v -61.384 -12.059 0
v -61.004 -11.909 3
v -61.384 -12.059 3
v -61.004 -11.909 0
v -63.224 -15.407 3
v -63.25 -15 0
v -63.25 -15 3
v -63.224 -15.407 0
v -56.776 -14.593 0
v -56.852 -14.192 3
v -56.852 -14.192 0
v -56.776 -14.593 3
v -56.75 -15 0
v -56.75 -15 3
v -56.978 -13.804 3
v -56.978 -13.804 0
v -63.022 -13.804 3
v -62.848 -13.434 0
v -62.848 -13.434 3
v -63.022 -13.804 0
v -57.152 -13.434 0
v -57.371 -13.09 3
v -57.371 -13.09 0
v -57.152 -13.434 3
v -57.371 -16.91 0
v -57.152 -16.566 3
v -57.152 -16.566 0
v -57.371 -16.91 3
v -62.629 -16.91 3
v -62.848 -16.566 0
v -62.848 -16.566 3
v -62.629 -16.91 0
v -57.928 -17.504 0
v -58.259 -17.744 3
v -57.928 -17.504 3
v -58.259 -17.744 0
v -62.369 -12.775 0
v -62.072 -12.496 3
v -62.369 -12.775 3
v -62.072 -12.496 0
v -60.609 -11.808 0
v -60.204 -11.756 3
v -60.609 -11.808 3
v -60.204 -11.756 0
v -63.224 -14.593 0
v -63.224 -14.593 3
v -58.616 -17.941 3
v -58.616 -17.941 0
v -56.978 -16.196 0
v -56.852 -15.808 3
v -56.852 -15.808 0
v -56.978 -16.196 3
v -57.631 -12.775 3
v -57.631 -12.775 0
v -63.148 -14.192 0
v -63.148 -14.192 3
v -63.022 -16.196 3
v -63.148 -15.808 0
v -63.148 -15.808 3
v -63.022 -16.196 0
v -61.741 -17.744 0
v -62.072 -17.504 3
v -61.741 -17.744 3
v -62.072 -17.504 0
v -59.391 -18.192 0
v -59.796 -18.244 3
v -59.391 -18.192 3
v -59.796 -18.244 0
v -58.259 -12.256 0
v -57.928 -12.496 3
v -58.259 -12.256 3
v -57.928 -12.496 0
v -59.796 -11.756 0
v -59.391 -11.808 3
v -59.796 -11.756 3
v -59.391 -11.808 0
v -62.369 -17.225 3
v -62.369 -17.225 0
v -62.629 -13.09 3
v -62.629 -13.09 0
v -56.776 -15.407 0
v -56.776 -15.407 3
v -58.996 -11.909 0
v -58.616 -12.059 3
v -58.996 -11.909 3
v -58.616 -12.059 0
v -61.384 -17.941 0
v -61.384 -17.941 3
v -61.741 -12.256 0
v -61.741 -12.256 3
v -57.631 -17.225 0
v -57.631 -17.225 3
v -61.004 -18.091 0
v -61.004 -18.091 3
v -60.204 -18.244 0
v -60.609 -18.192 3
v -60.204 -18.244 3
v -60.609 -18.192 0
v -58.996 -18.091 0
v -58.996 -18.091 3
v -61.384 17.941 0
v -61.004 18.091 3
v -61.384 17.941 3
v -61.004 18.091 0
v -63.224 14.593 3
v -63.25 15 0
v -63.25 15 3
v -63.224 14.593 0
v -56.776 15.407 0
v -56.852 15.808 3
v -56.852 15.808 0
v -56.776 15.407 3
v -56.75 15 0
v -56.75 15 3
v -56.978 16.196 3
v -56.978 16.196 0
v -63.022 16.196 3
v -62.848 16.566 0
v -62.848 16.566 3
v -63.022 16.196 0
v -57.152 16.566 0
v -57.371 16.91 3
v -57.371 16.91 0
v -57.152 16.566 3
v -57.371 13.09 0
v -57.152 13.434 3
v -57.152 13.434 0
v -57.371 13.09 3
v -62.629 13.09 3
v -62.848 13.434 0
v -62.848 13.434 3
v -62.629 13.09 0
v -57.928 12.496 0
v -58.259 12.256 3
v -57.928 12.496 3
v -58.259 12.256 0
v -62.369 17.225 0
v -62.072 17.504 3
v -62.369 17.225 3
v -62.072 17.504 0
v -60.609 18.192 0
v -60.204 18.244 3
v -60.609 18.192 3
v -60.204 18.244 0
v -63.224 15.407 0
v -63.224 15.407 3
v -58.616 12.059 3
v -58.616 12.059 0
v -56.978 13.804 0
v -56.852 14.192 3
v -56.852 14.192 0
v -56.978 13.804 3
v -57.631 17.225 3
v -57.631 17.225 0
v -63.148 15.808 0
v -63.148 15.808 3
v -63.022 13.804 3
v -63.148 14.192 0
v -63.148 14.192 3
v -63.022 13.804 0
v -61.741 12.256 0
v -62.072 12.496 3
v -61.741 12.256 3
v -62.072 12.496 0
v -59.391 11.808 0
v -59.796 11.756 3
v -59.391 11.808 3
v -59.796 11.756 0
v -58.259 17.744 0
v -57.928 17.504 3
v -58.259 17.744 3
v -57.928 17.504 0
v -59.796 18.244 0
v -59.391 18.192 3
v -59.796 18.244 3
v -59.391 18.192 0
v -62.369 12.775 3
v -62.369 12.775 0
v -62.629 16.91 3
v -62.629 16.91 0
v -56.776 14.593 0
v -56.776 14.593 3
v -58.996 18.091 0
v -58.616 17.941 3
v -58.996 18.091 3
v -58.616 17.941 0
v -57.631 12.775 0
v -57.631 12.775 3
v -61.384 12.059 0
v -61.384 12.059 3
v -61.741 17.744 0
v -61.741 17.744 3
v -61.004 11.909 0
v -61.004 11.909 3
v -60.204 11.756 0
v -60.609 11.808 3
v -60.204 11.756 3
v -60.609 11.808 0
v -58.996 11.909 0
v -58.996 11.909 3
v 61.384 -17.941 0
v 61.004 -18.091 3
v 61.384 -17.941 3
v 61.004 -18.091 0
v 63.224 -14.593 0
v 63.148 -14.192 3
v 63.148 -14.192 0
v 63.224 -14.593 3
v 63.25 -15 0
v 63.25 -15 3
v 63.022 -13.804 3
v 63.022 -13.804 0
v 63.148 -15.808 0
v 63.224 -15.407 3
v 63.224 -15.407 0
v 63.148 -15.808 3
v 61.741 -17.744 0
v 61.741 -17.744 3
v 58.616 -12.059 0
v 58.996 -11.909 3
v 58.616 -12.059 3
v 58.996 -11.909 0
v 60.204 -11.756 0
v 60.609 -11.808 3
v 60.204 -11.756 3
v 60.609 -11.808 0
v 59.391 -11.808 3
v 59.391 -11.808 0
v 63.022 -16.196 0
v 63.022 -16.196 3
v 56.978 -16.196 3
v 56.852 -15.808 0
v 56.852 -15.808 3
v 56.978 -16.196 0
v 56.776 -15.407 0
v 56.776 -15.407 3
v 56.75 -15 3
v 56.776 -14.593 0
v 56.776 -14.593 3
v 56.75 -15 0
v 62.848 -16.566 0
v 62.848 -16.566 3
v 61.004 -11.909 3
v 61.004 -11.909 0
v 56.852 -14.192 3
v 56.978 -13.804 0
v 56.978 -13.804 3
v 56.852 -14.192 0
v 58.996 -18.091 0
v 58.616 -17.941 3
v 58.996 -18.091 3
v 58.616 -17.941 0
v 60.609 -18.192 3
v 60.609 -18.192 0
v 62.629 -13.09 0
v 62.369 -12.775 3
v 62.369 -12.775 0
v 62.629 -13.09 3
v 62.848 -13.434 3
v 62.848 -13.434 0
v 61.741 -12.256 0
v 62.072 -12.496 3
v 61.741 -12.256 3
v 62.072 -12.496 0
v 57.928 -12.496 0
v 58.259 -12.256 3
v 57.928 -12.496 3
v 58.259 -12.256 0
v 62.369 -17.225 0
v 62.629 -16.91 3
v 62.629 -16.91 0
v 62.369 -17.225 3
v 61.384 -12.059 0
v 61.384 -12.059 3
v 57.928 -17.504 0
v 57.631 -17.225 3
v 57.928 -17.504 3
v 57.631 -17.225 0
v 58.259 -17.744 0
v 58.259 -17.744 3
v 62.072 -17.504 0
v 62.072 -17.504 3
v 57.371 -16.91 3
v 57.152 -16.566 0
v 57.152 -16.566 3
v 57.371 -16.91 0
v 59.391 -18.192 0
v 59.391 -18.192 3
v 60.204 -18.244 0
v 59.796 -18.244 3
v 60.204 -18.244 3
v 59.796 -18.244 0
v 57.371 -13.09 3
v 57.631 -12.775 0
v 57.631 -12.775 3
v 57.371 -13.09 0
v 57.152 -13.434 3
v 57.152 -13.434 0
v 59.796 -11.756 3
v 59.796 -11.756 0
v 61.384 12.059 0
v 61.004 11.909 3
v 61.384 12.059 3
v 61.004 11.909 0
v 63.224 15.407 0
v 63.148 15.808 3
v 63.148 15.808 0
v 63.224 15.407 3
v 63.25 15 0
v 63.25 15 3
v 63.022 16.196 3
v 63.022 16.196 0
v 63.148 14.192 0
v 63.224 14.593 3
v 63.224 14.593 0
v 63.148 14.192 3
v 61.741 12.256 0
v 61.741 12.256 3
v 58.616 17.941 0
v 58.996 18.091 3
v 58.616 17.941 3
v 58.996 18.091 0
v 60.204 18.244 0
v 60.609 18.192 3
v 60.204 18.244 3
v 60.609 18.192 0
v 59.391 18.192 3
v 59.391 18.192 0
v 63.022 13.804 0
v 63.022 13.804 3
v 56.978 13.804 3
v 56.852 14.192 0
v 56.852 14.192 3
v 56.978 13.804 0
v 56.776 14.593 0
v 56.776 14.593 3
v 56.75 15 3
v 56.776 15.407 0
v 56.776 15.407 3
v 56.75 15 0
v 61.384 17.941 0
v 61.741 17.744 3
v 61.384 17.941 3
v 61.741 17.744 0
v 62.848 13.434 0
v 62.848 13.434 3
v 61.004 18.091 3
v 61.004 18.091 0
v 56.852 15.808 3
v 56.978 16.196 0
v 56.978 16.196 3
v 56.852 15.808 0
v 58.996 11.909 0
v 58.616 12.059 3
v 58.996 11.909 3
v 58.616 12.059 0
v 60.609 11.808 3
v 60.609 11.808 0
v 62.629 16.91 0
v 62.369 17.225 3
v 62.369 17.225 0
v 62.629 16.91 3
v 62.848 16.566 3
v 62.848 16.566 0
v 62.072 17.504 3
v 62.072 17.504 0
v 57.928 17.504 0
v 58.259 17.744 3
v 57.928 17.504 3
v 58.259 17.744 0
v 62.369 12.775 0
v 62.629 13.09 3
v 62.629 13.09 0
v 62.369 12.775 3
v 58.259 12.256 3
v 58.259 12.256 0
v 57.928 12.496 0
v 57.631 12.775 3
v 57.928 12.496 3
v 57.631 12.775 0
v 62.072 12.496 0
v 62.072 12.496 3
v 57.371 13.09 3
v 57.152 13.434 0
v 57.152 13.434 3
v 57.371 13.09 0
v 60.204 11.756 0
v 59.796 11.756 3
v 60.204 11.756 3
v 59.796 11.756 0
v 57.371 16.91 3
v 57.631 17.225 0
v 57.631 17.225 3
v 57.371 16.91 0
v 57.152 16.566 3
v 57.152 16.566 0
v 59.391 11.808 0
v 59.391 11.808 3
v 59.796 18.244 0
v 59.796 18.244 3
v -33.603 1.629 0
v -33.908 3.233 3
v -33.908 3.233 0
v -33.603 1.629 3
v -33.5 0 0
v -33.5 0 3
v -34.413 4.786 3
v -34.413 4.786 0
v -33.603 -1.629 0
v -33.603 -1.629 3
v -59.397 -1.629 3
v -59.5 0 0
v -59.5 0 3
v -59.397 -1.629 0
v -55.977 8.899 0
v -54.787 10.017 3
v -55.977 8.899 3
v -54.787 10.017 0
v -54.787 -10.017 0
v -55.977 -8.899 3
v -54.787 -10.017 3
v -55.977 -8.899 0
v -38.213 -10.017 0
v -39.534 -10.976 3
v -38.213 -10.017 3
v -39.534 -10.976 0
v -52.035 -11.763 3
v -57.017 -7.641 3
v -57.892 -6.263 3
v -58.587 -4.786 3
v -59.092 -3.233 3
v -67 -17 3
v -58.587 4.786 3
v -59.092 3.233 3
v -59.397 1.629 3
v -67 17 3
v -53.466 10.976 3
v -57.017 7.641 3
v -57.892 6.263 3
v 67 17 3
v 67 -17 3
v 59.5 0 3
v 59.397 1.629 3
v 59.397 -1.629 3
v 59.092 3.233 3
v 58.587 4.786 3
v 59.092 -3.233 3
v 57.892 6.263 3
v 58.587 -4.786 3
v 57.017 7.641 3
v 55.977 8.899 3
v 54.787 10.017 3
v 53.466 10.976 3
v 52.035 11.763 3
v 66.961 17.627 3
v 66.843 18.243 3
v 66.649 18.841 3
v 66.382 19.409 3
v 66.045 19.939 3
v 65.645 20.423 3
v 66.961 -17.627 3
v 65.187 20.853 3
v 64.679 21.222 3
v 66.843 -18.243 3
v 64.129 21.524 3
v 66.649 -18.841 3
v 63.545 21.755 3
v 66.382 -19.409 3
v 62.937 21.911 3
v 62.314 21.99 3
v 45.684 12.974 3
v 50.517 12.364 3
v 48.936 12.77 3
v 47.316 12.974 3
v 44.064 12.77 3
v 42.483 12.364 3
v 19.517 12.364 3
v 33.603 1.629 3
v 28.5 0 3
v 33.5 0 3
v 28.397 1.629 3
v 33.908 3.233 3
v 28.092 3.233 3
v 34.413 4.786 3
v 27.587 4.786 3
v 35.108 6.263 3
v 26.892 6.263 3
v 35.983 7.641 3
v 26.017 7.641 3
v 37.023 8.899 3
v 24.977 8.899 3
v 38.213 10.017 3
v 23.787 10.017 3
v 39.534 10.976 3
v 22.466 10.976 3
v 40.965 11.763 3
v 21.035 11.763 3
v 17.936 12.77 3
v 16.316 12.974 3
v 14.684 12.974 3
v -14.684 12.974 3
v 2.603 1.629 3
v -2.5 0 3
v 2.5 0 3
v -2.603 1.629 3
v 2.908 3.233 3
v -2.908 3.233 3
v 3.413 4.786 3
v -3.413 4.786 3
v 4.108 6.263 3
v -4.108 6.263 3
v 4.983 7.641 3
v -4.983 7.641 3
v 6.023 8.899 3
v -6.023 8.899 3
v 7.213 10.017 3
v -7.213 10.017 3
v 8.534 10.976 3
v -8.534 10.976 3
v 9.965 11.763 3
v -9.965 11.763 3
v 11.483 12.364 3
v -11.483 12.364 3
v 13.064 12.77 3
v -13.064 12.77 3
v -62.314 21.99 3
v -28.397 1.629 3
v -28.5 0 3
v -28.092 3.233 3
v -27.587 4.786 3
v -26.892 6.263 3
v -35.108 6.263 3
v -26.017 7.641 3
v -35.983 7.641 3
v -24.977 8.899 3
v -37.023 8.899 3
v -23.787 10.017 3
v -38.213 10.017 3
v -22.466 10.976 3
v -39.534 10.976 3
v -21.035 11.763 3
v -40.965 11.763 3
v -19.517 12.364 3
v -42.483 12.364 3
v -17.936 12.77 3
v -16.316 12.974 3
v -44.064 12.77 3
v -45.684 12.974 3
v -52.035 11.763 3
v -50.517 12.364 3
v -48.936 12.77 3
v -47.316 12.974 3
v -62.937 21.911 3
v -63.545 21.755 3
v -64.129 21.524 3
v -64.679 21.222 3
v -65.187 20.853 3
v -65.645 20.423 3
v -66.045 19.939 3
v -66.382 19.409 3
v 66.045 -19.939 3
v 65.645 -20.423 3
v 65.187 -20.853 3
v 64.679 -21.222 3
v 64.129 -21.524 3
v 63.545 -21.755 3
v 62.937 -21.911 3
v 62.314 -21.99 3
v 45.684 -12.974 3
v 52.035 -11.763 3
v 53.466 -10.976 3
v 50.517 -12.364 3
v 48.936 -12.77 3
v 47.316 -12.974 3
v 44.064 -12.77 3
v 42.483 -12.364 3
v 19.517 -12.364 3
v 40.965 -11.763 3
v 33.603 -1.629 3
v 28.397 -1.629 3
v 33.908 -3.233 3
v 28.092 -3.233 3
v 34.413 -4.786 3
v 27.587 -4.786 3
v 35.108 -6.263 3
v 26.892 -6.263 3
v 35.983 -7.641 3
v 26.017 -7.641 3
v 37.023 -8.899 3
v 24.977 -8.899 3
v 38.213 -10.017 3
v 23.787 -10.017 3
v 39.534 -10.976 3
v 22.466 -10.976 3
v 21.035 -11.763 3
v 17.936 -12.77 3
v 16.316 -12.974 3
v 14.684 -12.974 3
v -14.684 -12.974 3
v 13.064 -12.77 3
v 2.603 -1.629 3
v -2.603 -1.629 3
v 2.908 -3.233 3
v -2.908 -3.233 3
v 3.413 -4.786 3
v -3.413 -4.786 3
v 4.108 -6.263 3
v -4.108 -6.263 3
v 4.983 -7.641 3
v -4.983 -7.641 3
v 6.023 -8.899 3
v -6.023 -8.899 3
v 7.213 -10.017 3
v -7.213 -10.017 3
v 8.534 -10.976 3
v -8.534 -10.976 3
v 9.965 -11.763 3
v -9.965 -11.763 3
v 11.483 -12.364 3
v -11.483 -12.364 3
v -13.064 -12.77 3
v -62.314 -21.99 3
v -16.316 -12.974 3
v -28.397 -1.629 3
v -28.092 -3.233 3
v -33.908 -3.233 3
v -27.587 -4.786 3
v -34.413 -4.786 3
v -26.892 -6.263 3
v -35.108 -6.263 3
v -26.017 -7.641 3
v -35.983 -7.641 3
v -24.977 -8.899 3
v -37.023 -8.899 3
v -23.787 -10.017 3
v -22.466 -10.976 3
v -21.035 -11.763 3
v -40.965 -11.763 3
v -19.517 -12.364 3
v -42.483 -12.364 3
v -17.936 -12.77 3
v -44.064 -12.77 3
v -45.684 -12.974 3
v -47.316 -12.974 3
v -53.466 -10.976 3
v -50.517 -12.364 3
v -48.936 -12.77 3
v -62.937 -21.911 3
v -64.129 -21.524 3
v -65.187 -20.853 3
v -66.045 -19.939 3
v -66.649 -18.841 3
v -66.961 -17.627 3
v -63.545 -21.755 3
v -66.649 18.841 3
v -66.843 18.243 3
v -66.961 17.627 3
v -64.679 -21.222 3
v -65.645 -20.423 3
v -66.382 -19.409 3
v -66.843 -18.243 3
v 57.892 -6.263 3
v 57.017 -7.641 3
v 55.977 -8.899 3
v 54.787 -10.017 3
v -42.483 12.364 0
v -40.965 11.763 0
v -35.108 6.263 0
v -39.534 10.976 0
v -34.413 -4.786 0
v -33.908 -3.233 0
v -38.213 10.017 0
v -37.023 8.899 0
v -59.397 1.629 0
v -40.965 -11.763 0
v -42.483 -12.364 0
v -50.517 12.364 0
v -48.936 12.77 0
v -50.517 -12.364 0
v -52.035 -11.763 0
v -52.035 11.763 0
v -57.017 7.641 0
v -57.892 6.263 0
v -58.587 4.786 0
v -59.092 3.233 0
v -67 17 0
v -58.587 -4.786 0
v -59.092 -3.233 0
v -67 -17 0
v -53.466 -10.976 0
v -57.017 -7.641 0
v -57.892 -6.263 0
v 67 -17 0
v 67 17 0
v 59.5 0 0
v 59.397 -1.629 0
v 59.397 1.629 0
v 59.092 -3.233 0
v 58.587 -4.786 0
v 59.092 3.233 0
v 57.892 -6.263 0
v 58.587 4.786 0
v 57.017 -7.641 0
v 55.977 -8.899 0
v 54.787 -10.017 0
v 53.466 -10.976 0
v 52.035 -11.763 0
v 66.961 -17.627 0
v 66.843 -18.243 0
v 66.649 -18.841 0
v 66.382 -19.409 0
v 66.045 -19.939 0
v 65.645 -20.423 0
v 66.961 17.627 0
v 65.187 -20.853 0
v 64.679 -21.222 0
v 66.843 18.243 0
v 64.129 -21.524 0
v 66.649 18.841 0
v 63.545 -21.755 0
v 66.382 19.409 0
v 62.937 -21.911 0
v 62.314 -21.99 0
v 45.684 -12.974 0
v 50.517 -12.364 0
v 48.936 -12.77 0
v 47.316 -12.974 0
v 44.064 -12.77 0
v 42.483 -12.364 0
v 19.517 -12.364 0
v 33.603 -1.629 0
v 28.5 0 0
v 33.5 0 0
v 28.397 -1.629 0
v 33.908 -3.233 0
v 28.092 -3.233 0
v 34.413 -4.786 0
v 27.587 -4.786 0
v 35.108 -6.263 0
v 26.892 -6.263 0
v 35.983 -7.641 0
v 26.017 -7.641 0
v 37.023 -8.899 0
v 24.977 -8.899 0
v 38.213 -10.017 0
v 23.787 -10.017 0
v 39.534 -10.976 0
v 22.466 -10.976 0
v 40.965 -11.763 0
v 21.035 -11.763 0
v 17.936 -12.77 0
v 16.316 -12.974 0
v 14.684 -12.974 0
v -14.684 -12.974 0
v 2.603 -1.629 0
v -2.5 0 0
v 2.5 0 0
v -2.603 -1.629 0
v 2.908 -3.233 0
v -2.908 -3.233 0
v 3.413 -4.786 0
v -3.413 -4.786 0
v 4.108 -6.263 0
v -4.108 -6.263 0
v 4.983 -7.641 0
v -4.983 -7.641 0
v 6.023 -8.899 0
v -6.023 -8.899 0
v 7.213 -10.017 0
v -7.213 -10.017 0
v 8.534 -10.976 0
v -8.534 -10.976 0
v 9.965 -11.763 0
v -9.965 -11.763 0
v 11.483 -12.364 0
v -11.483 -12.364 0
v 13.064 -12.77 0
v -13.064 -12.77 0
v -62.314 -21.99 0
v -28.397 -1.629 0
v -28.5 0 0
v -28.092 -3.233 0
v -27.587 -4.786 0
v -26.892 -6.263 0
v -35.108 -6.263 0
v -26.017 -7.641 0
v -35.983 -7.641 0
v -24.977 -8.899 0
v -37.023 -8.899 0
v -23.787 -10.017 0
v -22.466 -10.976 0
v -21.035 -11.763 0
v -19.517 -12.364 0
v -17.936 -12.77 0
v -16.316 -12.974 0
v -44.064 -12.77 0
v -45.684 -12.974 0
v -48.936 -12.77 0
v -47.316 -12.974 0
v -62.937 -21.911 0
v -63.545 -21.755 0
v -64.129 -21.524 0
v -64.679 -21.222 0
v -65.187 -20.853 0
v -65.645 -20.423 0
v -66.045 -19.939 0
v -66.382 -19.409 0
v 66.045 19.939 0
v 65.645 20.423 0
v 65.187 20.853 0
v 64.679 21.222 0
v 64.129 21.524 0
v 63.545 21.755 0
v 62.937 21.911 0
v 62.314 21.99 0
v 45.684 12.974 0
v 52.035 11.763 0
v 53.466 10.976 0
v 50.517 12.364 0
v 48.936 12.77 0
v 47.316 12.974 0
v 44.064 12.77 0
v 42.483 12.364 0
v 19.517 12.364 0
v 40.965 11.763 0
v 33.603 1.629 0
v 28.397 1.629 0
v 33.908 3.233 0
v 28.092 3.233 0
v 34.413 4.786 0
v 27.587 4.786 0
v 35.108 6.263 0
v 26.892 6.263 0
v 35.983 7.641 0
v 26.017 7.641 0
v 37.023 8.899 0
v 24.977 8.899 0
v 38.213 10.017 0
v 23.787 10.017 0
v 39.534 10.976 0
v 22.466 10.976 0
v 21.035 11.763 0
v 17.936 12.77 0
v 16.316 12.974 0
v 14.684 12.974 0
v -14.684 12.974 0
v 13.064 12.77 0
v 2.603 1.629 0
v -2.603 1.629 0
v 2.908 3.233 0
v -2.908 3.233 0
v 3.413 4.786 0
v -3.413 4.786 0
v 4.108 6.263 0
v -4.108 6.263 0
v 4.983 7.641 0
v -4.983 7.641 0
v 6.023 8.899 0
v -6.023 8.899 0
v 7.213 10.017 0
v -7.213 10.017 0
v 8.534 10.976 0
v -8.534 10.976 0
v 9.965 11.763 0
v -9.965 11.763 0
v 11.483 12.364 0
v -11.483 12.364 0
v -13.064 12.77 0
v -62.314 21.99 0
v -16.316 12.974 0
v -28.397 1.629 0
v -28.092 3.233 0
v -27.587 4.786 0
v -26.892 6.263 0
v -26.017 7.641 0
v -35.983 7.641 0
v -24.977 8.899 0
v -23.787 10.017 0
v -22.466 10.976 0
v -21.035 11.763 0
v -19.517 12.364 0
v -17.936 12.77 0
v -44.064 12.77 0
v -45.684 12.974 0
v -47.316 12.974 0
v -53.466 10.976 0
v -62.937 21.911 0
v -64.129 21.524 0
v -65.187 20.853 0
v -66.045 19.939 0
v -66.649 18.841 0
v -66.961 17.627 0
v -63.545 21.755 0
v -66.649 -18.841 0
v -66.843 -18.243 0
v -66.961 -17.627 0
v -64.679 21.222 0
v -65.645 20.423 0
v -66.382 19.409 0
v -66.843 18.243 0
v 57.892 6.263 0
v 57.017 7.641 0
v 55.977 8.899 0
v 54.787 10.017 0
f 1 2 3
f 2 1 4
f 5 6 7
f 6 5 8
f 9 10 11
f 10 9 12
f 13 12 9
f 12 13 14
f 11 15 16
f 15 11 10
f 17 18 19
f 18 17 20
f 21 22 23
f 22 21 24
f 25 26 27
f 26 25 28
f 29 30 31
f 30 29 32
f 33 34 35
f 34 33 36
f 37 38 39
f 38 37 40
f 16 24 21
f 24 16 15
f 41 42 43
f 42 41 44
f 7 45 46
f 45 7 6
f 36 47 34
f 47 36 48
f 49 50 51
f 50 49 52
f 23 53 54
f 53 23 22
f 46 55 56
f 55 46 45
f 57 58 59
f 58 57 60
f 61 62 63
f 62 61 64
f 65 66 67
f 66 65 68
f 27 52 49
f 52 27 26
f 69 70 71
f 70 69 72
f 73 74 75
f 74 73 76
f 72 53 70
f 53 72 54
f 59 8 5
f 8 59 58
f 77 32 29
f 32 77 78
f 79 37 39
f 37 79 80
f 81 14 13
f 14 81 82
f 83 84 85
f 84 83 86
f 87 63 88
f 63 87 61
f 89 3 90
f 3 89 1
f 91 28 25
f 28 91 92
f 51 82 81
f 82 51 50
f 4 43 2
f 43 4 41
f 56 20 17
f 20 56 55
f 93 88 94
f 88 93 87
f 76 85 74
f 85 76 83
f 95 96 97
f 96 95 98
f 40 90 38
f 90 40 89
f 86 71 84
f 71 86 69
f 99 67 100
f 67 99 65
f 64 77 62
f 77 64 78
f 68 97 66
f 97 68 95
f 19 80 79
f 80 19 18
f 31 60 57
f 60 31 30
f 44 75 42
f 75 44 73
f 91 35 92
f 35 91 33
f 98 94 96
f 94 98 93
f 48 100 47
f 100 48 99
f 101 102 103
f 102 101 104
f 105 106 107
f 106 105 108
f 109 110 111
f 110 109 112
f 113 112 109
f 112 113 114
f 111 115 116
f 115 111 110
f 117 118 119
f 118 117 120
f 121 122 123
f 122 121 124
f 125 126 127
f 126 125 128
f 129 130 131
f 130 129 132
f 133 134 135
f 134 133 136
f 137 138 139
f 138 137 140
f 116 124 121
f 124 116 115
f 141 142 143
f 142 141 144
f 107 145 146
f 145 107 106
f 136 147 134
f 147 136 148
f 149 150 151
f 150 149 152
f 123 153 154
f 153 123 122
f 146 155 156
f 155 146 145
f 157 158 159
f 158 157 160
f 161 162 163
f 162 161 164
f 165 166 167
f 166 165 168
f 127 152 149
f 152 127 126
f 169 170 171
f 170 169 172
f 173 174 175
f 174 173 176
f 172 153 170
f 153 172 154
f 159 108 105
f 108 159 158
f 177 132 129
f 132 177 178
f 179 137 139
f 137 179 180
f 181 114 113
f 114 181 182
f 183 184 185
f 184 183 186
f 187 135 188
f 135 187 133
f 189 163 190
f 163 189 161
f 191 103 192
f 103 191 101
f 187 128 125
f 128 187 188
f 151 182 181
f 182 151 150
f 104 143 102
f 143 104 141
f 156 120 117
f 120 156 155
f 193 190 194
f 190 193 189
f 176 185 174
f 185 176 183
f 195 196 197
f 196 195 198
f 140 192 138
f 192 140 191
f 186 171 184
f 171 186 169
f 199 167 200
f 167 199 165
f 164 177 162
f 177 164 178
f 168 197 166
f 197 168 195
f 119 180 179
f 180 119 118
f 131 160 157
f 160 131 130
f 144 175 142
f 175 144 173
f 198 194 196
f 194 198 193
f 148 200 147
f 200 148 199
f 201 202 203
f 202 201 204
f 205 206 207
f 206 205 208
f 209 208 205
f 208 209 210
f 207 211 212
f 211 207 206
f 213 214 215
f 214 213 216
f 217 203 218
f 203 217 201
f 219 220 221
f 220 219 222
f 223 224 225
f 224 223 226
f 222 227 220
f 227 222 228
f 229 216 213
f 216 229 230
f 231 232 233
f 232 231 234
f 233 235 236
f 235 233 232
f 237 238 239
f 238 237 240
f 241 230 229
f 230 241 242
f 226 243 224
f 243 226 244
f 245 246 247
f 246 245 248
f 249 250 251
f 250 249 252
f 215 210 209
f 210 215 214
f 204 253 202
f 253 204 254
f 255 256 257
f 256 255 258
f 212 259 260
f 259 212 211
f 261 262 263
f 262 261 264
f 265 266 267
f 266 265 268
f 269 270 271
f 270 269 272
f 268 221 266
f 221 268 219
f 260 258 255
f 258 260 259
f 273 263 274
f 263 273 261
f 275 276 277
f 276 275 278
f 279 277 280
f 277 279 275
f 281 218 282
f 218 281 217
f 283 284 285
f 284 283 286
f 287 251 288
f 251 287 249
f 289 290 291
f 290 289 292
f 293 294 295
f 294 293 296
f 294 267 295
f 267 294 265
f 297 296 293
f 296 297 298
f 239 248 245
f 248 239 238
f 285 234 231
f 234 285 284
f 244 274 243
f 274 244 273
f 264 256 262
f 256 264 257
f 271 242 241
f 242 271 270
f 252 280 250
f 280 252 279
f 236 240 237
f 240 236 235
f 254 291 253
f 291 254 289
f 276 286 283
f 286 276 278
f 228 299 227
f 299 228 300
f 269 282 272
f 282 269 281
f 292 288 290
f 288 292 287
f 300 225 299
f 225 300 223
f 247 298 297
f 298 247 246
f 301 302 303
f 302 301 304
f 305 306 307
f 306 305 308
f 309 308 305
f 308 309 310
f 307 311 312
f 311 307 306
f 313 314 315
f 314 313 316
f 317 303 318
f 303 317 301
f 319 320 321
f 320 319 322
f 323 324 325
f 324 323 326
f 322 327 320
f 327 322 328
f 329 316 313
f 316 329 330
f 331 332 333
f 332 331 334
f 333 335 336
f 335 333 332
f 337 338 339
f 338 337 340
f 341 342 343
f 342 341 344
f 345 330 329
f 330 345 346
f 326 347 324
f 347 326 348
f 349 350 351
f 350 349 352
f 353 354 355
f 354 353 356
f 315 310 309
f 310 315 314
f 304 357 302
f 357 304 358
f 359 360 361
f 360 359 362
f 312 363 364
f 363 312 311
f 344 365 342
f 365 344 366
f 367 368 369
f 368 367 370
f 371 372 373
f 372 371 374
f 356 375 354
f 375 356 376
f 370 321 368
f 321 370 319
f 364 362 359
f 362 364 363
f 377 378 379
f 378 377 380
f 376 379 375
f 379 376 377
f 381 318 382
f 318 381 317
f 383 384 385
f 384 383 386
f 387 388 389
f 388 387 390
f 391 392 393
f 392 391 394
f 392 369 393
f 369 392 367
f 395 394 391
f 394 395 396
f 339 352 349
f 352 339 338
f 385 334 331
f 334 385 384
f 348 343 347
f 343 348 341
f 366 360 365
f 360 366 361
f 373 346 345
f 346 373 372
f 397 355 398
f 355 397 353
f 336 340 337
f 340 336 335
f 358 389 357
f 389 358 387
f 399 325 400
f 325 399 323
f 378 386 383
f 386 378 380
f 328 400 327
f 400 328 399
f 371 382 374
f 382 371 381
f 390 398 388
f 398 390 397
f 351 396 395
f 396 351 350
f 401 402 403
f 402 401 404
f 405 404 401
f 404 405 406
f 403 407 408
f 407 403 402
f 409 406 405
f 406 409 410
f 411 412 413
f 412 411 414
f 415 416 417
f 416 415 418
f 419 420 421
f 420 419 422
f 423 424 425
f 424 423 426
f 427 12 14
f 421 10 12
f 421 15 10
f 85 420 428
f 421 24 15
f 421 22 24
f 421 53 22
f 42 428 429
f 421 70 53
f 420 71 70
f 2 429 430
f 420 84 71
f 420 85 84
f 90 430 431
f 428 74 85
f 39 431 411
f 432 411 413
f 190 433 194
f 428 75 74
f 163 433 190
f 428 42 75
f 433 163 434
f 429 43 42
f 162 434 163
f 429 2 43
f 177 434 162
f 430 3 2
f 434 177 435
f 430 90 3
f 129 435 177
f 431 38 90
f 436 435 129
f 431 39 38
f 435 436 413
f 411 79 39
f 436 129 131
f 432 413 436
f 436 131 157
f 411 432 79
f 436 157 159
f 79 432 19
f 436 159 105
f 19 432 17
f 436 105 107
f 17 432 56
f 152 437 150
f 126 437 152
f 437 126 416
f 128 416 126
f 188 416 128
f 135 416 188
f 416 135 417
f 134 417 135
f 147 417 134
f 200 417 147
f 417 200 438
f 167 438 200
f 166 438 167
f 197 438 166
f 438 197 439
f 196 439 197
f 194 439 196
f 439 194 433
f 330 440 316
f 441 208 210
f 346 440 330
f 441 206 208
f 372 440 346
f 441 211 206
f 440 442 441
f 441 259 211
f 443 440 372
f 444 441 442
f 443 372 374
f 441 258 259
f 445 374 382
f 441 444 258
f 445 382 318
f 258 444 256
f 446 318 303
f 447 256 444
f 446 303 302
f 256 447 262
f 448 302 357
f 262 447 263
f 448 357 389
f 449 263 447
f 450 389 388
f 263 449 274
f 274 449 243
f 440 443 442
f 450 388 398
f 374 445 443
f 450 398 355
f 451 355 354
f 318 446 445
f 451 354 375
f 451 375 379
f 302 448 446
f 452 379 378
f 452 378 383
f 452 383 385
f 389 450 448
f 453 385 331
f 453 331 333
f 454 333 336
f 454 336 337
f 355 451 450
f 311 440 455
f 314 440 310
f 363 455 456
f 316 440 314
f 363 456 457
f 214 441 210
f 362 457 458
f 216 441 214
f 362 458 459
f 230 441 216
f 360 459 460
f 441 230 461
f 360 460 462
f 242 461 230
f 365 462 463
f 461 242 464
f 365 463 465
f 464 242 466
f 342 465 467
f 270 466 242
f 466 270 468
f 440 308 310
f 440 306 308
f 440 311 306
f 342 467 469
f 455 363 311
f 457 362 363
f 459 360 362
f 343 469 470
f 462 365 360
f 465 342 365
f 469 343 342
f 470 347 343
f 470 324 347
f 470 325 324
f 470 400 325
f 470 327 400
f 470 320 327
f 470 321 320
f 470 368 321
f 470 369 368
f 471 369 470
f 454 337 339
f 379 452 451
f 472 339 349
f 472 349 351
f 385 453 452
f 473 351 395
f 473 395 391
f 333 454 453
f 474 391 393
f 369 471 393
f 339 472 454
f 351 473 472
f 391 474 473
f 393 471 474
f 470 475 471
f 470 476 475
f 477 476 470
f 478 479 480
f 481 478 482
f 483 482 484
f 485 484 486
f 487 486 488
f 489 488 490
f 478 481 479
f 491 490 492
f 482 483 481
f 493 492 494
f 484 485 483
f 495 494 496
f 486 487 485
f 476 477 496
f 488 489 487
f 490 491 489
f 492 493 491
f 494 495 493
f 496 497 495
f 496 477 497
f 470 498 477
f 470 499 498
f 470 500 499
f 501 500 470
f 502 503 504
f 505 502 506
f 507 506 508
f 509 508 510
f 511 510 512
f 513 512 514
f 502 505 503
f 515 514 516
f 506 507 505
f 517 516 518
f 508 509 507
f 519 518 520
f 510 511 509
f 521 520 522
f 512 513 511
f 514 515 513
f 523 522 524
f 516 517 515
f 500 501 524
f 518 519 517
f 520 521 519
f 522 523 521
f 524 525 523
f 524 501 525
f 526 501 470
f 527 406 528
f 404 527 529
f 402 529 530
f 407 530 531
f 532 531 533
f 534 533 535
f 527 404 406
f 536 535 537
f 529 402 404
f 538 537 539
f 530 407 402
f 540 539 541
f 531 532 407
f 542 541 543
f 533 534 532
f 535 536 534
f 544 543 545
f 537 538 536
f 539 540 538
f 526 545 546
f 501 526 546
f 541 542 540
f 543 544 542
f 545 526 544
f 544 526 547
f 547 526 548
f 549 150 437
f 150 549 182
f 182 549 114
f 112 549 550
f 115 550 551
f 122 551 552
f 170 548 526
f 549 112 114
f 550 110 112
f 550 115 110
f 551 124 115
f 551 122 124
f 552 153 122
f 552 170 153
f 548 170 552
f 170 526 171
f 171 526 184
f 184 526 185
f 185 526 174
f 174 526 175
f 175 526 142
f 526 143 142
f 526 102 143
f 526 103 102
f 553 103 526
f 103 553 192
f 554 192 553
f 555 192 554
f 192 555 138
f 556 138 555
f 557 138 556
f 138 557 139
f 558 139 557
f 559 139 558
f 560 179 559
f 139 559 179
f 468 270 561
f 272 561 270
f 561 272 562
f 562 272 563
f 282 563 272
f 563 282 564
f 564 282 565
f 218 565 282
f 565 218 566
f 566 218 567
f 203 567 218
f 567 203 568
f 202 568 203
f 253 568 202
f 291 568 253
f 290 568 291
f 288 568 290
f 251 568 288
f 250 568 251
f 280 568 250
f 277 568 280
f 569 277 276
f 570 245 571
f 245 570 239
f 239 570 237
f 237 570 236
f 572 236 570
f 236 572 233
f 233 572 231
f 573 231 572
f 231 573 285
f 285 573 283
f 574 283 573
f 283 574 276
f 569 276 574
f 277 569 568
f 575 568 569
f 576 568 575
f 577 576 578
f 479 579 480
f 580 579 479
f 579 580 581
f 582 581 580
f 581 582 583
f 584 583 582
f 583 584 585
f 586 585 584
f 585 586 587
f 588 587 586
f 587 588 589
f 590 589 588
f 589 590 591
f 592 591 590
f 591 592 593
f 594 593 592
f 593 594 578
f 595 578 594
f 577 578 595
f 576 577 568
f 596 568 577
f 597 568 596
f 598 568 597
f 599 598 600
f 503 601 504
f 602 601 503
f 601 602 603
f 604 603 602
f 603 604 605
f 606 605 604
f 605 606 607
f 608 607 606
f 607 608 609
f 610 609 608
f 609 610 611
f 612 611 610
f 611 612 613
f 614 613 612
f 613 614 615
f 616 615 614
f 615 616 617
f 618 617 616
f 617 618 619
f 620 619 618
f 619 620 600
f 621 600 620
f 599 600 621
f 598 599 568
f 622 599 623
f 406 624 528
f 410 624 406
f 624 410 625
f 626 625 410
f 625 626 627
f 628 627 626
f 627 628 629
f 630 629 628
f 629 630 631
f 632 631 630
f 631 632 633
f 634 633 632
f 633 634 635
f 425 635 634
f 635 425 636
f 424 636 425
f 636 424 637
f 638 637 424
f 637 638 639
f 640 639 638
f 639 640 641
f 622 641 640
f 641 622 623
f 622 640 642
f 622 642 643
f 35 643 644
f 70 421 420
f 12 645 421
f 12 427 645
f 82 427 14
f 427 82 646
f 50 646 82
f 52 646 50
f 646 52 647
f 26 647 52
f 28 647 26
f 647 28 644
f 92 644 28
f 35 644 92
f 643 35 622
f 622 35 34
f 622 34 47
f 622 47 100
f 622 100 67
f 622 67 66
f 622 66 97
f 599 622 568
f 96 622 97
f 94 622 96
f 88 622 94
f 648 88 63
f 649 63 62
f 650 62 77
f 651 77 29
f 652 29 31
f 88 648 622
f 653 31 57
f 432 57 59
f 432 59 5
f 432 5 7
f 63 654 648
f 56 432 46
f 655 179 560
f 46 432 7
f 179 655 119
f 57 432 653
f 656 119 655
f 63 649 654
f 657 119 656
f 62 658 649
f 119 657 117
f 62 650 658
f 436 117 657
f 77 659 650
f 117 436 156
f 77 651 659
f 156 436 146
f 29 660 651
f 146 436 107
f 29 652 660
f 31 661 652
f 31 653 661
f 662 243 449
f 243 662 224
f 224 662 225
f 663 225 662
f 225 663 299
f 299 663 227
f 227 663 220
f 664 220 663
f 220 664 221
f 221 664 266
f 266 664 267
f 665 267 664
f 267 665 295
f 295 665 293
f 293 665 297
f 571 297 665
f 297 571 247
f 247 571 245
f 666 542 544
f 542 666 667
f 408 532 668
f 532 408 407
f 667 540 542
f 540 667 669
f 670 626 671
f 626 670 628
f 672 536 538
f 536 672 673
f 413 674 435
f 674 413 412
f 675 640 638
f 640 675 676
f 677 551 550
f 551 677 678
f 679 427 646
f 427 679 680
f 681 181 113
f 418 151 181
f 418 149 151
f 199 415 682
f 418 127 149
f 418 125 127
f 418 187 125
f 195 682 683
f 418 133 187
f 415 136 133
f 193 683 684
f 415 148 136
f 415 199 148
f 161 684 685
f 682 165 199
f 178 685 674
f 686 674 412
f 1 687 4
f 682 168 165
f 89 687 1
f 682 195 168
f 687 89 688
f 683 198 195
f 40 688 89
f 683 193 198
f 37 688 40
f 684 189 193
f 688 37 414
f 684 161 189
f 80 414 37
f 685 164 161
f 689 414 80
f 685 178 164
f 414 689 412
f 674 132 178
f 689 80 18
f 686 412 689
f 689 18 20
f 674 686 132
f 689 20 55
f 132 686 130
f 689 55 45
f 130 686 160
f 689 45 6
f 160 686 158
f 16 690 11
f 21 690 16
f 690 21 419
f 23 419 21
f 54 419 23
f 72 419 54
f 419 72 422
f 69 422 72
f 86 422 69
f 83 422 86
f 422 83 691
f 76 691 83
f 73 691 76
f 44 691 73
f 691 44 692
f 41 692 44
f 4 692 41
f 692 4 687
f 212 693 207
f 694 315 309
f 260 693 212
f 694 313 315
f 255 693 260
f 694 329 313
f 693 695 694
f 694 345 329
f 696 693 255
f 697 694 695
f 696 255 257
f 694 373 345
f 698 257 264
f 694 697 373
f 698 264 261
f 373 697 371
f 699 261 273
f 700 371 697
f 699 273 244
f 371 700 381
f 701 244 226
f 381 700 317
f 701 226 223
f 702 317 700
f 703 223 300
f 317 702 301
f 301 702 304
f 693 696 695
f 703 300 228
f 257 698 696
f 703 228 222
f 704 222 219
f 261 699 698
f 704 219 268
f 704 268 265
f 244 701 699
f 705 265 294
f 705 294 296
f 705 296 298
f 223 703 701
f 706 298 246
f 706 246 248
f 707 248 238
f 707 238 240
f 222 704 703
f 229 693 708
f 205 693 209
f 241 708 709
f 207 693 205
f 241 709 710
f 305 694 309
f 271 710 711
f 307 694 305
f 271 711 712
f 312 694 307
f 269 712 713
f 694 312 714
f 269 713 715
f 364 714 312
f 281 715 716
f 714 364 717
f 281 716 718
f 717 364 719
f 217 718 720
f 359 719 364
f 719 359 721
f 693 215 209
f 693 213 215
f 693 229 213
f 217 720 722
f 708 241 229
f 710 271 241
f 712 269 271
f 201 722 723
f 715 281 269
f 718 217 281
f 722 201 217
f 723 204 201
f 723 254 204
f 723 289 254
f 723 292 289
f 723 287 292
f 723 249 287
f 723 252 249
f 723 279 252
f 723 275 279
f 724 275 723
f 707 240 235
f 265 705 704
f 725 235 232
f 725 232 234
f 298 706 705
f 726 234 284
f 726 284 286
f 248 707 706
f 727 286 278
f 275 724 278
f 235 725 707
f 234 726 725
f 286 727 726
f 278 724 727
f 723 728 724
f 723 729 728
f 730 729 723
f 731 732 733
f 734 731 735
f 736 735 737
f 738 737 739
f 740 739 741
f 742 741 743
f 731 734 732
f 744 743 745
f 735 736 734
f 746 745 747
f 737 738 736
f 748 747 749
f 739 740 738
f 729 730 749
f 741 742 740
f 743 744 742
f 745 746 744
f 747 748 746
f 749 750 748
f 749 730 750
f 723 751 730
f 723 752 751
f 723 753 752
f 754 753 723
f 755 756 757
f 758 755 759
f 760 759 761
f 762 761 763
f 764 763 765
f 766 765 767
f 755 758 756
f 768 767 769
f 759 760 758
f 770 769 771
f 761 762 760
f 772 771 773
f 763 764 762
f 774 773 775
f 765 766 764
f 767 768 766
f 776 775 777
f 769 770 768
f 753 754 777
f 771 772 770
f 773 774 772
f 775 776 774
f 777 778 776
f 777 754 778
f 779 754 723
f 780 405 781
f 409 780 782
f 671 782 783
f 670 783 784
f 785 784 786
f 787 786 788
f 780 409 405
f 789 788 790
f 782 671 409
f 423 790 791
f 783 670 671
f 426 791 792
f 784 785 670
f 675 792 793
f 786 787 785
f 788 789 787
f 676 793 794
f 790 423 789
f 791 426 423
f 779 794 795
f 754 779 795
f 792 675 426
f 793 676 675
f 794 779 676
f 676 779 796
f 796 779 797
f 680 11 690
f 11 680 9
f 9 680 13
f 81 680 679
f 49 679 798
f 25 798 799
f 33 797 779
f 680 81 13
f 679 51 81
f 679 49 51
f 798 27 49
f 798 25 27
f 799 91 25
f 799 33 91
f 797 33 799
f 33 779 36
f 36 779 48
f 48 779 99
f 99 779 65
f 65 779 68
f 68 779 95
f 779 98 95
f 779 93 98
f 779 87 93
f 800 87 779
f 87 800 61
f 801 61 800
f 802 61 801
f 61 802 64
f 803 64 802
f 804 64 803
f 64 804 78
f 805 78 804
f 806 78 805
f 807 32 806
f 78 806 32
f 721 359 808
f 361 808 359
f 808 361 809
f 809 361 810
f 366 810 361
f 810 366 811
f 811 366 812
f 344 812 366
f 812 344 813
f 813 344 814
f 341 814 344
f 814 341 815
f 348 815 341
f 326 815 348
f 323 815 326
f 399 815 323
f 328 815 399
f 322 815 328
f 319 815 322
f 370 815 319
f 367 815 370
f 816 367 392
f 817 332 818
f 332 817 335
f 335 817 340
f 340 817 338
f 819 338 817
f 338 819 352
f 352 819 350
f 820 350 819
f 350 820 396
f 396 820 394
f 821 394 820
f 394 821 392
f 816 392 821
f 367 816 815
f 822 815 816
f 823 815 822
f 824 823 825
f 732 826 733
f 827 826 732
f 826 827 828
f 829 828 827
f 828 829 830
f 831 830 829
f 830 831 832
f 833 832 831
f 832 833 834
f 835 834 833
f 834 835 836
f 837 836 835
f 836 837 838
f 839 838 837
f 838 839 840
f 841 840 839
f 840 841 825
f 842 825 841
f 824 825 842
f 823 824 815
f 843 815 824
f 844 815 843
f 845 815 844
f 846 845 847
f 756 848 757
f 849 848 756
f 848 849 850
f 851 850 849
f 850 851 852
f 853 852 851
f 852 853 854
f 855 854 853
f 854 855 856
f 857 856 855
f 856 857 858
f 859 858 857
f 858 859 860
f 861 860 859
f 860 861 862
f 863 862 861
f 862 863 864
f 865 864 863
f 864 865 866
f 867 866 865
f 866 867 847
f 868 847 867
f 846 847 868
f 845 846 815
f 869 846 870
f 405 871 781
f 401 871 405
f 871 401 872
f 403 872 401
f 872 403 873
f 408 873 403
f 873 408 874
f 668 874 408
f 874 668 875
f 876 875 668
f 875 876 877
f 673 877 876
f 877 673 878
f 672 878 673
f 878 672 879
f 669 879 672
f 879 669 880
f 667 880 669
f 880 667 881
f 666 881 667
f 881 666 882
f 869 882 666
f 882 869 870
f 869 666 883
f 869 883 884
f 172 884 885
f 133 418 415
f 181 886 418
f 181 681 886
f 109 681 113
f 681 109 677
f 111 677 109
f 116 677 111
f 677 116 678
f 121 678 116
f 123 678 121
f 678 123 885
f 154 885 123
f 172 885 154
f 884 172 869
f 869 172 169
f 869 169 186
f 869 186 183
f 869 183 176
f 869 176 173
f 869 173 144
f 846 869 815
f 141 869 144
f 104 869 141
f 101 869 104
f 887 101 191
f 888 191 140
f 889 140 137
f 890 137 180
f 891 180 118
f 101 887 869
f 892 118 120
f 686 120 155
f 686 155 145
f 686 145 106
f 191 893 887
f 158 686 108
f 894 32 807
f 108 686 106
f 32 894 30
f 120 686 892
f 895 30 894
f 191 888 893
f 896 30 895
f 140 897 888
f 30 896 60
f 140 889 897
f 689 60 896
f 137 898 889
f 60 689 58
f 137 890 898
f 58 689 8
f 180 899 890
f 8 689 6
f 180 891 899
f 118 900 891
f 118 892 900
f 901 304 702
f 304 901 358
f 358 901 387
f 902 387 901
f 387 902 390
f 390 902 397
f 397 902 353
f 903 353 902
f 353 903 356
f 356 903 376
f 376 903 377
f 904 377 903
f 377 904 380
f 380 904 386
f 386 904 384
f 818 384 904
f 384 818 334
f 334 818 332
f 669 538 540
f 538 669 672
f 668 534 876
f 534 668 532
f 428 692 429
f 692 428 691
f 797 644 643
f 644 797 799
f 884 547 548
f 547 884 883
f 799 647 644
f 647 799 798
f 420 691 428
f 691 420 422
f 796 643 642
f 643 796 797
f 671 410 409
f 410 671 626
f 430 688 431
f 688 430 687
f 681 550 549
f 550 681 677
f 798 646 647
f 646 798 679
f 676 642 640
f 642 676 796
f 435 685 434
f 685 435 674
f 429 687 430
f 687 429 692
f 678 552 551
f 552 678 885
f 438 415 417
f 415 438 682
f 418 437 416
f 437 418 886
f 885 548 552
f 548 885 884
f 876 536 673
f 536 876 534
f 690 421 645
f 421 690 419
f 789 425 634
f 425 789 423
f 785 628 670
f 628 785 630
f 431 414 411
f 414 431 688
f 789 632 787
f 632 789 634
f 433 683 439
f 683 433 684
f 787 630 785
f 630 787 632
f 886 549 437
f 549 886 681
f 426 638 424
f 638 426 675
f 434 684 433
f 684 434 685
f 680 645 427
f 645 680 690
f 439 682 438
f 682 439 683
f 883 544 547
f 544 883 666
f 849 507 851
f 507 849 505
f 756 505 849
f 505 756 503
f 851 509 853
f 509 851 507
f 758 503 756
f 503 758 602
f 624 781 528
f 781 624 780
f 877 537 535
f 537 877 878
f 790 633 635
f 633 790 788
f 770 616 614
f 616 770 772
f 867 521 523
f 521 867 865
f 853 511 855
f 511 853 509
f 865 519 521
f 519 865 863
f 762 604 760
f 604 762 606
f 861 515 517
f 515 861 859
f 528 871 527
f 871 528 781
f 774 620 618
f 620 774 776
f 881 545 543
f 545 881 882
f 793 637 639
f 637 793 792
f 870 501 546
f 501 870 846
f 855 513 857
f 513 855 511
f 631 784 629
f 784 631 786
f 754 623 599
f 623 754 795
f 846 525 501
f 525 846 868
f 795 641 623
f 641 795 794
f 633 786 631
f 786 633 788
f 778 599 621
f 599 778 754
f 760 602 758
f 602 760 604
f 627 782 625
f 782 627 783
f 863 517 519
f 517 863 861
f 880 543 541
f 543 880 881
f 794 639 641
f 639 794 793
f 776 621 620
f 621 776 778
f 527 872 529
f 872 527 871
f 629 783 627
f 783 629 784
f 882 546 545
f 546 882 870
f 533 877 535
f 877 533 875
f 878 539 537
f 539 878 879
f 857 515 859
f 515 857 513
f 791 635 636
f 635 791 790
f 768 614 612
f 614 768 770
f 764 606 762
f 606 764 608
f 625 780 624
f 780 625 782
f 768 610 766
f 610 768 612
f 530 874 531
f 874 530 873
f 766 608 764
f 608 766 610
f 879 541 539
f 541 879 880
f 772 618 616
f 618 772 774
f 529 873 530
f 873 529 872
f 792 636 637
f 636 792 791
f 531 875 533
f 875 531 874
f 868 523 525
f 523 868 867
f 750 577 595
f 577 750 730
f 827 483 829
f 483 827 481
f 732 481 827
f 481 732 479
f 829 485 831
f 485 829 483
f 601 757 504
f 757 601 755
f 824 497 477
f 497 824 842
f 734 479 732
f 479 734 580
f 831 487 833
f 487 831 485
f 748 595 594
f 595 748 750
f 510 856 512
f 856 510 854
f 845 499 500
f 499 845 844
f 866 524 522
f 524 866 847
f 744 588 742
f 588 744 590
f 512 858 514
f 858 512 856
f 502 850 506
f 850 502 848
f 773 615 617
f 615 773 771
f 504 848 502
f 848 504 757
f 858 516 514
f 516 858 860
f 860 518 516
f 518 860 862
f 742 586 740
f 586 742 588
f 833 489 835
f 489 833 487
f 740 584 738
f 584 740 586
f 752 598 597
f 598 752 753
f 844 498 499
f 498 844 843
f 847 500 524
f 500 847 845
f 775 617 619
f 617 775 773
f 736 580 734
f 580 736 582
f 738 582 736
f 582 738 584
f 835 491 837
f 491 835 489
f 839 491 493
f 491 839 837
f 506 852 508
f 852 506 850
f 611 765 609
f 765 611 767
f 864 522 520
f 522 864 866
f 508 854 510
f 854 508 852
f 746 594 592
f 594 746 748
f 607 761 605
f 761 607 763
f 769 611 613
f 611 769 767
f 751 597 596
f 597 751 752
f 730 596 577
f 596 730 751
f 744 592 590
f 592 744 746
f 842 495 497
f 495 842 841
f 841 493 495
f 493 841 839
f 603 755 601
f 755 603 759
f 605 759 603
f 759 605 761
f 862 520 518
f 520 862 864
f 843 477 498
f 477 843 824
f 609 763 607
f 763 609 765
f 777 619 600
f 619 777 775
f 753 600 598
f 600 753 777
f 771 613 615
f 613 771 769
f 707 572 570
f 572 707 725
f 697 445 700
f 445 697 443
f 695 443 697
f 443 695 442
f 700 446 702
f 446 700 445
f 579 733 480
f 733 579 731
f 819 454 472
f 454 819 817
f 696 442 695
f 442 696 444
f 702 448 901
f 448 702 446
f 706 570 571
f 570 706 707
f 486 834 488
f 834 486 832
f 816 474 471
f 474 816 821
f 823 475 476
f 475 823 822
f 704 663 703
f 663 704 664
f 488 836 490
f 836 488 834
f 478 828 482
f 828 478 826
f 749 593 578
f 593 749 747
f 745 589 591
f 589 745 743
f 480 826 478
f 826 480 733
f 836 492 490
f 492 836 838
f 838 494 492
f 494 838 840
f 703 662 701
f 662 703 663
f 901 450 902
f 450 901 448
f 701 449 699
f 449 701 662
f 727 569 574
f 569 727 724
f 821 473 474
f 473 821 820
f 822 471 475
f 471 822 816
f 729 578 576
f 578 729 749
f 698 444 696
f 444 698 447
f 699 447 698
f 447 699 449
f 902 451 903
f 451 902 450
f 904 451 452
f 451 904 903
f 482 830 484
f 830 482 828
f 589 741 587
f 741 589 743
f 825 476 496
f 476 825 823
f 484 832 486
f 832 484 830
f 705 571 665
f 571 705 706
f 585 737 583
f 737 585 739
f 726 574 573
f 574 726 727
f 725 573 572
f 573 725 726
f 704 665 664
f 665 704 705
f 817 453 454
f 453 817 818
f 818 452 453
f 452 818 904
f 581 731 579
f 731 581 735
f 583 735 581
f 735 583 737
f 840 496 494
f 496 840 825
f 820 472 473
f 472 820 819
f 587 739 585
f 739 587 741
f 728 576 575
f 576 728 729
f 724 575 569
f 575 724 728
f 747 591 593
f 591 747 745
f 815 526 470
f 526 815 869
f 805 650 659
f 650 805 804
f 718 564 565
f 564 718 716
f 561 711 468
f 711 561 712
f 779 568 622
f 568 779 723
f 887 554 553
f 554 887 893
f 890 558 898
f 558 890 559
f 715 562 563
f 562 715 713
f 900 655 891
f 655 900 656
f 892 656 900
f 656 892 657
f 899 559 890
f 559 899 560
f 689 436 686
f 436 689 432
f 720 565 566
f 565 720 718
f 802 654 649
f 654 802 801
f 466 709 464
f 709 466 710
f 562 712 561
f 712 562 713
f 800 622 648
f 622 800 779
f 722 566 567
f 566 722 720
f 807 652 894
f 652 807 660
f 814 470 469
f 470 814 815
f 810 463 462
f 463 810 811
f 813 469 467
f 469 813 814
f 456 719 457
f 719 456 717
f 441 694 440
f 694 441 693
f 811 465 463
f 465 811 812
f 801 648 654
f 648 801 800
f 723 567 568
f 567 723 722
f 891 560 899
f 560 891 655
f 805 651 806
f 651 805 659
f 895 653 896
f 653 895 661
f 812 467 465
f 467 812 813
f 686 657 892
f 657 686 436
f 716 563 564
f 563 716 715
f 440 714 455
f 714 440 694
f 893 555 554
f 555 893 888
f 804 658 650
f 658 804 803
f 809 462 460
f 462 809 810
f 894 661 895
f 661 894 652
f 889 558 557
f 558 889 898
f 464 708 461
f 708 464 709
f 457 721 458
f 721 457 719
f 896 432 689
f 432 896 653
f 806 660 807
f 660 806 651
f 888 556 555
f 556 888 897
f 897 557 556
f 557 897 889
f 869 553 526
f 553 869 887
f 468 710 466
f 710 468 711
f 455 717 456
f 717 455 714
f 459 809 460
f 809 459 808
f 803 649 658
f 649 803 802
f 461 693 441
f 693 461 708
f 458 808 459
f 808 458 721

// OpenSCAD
$fn = 50;

difference() {
	union() {
		hull() {
			translate(v = [-62.0, 17.0, 0]) {
				cylinder(h = 3, r = 5);
			}
			translate(v = [62.0, 17.0, 0]) {
				cylinder(h = 3, r = 5);
			}
			translate(v = [-62.0, -17.0, 0]) {
				cylinder(h = 3, r = 5);
			}
			translate(v = [62.0, -17.0, 0]) {
				cylinder(h = 3, r = 5);
			}
		}
	}
	union() {
		translate(v = [-60.0, -15.0, -100.0]) {
			cylinder(h = 200, r = 3.25);
		}
		translate(v = [-60.0, 15.0, -100.0]) {
			cylinder(h = 200, r = 3.25);
		}
		translate(v = [60.0, -15.0, -100.0]) {
			cylinder(h = 200, r = 3.25);
		}
		translate(v = [60.0, 15.0, -100.0]) {
			cylinder(h = 200, r = 3.25);
		}
		translate(v = [-60.0, -15.0, -100.0]) {
			cylinder(h = 200, r = 1.8);
		}
		translate(v = [-60.0, 15.0, -100.0]) {
			cylinder(h = 200, r = 1.8);
		}
		translate(v = [60.0, -15.0, -100.0]) {
			cylinder(h = 200, r = 1.8);
		}
		translate(v = [60.0, 15.0, -100.0]) {
			cylinder(h = 200, r = 1.8);
		}
		translate(v = [-46.5, 0, 0.0]) {
			cylinder(h = 3, r = 13.0);
		}
		translate(v = [-15.5, 0, 0.0]) {
			cylinder(h = 3, r = 13.0);
		}
		translate(v = [15.5, 0, 0.0]) {
			cylinder(h = 3, r = 13.0);
		}
		translate(v = [46.5, 0, 0.0]) {
			cylinder(h = 3, r = 13.0);
		}
	}
}
